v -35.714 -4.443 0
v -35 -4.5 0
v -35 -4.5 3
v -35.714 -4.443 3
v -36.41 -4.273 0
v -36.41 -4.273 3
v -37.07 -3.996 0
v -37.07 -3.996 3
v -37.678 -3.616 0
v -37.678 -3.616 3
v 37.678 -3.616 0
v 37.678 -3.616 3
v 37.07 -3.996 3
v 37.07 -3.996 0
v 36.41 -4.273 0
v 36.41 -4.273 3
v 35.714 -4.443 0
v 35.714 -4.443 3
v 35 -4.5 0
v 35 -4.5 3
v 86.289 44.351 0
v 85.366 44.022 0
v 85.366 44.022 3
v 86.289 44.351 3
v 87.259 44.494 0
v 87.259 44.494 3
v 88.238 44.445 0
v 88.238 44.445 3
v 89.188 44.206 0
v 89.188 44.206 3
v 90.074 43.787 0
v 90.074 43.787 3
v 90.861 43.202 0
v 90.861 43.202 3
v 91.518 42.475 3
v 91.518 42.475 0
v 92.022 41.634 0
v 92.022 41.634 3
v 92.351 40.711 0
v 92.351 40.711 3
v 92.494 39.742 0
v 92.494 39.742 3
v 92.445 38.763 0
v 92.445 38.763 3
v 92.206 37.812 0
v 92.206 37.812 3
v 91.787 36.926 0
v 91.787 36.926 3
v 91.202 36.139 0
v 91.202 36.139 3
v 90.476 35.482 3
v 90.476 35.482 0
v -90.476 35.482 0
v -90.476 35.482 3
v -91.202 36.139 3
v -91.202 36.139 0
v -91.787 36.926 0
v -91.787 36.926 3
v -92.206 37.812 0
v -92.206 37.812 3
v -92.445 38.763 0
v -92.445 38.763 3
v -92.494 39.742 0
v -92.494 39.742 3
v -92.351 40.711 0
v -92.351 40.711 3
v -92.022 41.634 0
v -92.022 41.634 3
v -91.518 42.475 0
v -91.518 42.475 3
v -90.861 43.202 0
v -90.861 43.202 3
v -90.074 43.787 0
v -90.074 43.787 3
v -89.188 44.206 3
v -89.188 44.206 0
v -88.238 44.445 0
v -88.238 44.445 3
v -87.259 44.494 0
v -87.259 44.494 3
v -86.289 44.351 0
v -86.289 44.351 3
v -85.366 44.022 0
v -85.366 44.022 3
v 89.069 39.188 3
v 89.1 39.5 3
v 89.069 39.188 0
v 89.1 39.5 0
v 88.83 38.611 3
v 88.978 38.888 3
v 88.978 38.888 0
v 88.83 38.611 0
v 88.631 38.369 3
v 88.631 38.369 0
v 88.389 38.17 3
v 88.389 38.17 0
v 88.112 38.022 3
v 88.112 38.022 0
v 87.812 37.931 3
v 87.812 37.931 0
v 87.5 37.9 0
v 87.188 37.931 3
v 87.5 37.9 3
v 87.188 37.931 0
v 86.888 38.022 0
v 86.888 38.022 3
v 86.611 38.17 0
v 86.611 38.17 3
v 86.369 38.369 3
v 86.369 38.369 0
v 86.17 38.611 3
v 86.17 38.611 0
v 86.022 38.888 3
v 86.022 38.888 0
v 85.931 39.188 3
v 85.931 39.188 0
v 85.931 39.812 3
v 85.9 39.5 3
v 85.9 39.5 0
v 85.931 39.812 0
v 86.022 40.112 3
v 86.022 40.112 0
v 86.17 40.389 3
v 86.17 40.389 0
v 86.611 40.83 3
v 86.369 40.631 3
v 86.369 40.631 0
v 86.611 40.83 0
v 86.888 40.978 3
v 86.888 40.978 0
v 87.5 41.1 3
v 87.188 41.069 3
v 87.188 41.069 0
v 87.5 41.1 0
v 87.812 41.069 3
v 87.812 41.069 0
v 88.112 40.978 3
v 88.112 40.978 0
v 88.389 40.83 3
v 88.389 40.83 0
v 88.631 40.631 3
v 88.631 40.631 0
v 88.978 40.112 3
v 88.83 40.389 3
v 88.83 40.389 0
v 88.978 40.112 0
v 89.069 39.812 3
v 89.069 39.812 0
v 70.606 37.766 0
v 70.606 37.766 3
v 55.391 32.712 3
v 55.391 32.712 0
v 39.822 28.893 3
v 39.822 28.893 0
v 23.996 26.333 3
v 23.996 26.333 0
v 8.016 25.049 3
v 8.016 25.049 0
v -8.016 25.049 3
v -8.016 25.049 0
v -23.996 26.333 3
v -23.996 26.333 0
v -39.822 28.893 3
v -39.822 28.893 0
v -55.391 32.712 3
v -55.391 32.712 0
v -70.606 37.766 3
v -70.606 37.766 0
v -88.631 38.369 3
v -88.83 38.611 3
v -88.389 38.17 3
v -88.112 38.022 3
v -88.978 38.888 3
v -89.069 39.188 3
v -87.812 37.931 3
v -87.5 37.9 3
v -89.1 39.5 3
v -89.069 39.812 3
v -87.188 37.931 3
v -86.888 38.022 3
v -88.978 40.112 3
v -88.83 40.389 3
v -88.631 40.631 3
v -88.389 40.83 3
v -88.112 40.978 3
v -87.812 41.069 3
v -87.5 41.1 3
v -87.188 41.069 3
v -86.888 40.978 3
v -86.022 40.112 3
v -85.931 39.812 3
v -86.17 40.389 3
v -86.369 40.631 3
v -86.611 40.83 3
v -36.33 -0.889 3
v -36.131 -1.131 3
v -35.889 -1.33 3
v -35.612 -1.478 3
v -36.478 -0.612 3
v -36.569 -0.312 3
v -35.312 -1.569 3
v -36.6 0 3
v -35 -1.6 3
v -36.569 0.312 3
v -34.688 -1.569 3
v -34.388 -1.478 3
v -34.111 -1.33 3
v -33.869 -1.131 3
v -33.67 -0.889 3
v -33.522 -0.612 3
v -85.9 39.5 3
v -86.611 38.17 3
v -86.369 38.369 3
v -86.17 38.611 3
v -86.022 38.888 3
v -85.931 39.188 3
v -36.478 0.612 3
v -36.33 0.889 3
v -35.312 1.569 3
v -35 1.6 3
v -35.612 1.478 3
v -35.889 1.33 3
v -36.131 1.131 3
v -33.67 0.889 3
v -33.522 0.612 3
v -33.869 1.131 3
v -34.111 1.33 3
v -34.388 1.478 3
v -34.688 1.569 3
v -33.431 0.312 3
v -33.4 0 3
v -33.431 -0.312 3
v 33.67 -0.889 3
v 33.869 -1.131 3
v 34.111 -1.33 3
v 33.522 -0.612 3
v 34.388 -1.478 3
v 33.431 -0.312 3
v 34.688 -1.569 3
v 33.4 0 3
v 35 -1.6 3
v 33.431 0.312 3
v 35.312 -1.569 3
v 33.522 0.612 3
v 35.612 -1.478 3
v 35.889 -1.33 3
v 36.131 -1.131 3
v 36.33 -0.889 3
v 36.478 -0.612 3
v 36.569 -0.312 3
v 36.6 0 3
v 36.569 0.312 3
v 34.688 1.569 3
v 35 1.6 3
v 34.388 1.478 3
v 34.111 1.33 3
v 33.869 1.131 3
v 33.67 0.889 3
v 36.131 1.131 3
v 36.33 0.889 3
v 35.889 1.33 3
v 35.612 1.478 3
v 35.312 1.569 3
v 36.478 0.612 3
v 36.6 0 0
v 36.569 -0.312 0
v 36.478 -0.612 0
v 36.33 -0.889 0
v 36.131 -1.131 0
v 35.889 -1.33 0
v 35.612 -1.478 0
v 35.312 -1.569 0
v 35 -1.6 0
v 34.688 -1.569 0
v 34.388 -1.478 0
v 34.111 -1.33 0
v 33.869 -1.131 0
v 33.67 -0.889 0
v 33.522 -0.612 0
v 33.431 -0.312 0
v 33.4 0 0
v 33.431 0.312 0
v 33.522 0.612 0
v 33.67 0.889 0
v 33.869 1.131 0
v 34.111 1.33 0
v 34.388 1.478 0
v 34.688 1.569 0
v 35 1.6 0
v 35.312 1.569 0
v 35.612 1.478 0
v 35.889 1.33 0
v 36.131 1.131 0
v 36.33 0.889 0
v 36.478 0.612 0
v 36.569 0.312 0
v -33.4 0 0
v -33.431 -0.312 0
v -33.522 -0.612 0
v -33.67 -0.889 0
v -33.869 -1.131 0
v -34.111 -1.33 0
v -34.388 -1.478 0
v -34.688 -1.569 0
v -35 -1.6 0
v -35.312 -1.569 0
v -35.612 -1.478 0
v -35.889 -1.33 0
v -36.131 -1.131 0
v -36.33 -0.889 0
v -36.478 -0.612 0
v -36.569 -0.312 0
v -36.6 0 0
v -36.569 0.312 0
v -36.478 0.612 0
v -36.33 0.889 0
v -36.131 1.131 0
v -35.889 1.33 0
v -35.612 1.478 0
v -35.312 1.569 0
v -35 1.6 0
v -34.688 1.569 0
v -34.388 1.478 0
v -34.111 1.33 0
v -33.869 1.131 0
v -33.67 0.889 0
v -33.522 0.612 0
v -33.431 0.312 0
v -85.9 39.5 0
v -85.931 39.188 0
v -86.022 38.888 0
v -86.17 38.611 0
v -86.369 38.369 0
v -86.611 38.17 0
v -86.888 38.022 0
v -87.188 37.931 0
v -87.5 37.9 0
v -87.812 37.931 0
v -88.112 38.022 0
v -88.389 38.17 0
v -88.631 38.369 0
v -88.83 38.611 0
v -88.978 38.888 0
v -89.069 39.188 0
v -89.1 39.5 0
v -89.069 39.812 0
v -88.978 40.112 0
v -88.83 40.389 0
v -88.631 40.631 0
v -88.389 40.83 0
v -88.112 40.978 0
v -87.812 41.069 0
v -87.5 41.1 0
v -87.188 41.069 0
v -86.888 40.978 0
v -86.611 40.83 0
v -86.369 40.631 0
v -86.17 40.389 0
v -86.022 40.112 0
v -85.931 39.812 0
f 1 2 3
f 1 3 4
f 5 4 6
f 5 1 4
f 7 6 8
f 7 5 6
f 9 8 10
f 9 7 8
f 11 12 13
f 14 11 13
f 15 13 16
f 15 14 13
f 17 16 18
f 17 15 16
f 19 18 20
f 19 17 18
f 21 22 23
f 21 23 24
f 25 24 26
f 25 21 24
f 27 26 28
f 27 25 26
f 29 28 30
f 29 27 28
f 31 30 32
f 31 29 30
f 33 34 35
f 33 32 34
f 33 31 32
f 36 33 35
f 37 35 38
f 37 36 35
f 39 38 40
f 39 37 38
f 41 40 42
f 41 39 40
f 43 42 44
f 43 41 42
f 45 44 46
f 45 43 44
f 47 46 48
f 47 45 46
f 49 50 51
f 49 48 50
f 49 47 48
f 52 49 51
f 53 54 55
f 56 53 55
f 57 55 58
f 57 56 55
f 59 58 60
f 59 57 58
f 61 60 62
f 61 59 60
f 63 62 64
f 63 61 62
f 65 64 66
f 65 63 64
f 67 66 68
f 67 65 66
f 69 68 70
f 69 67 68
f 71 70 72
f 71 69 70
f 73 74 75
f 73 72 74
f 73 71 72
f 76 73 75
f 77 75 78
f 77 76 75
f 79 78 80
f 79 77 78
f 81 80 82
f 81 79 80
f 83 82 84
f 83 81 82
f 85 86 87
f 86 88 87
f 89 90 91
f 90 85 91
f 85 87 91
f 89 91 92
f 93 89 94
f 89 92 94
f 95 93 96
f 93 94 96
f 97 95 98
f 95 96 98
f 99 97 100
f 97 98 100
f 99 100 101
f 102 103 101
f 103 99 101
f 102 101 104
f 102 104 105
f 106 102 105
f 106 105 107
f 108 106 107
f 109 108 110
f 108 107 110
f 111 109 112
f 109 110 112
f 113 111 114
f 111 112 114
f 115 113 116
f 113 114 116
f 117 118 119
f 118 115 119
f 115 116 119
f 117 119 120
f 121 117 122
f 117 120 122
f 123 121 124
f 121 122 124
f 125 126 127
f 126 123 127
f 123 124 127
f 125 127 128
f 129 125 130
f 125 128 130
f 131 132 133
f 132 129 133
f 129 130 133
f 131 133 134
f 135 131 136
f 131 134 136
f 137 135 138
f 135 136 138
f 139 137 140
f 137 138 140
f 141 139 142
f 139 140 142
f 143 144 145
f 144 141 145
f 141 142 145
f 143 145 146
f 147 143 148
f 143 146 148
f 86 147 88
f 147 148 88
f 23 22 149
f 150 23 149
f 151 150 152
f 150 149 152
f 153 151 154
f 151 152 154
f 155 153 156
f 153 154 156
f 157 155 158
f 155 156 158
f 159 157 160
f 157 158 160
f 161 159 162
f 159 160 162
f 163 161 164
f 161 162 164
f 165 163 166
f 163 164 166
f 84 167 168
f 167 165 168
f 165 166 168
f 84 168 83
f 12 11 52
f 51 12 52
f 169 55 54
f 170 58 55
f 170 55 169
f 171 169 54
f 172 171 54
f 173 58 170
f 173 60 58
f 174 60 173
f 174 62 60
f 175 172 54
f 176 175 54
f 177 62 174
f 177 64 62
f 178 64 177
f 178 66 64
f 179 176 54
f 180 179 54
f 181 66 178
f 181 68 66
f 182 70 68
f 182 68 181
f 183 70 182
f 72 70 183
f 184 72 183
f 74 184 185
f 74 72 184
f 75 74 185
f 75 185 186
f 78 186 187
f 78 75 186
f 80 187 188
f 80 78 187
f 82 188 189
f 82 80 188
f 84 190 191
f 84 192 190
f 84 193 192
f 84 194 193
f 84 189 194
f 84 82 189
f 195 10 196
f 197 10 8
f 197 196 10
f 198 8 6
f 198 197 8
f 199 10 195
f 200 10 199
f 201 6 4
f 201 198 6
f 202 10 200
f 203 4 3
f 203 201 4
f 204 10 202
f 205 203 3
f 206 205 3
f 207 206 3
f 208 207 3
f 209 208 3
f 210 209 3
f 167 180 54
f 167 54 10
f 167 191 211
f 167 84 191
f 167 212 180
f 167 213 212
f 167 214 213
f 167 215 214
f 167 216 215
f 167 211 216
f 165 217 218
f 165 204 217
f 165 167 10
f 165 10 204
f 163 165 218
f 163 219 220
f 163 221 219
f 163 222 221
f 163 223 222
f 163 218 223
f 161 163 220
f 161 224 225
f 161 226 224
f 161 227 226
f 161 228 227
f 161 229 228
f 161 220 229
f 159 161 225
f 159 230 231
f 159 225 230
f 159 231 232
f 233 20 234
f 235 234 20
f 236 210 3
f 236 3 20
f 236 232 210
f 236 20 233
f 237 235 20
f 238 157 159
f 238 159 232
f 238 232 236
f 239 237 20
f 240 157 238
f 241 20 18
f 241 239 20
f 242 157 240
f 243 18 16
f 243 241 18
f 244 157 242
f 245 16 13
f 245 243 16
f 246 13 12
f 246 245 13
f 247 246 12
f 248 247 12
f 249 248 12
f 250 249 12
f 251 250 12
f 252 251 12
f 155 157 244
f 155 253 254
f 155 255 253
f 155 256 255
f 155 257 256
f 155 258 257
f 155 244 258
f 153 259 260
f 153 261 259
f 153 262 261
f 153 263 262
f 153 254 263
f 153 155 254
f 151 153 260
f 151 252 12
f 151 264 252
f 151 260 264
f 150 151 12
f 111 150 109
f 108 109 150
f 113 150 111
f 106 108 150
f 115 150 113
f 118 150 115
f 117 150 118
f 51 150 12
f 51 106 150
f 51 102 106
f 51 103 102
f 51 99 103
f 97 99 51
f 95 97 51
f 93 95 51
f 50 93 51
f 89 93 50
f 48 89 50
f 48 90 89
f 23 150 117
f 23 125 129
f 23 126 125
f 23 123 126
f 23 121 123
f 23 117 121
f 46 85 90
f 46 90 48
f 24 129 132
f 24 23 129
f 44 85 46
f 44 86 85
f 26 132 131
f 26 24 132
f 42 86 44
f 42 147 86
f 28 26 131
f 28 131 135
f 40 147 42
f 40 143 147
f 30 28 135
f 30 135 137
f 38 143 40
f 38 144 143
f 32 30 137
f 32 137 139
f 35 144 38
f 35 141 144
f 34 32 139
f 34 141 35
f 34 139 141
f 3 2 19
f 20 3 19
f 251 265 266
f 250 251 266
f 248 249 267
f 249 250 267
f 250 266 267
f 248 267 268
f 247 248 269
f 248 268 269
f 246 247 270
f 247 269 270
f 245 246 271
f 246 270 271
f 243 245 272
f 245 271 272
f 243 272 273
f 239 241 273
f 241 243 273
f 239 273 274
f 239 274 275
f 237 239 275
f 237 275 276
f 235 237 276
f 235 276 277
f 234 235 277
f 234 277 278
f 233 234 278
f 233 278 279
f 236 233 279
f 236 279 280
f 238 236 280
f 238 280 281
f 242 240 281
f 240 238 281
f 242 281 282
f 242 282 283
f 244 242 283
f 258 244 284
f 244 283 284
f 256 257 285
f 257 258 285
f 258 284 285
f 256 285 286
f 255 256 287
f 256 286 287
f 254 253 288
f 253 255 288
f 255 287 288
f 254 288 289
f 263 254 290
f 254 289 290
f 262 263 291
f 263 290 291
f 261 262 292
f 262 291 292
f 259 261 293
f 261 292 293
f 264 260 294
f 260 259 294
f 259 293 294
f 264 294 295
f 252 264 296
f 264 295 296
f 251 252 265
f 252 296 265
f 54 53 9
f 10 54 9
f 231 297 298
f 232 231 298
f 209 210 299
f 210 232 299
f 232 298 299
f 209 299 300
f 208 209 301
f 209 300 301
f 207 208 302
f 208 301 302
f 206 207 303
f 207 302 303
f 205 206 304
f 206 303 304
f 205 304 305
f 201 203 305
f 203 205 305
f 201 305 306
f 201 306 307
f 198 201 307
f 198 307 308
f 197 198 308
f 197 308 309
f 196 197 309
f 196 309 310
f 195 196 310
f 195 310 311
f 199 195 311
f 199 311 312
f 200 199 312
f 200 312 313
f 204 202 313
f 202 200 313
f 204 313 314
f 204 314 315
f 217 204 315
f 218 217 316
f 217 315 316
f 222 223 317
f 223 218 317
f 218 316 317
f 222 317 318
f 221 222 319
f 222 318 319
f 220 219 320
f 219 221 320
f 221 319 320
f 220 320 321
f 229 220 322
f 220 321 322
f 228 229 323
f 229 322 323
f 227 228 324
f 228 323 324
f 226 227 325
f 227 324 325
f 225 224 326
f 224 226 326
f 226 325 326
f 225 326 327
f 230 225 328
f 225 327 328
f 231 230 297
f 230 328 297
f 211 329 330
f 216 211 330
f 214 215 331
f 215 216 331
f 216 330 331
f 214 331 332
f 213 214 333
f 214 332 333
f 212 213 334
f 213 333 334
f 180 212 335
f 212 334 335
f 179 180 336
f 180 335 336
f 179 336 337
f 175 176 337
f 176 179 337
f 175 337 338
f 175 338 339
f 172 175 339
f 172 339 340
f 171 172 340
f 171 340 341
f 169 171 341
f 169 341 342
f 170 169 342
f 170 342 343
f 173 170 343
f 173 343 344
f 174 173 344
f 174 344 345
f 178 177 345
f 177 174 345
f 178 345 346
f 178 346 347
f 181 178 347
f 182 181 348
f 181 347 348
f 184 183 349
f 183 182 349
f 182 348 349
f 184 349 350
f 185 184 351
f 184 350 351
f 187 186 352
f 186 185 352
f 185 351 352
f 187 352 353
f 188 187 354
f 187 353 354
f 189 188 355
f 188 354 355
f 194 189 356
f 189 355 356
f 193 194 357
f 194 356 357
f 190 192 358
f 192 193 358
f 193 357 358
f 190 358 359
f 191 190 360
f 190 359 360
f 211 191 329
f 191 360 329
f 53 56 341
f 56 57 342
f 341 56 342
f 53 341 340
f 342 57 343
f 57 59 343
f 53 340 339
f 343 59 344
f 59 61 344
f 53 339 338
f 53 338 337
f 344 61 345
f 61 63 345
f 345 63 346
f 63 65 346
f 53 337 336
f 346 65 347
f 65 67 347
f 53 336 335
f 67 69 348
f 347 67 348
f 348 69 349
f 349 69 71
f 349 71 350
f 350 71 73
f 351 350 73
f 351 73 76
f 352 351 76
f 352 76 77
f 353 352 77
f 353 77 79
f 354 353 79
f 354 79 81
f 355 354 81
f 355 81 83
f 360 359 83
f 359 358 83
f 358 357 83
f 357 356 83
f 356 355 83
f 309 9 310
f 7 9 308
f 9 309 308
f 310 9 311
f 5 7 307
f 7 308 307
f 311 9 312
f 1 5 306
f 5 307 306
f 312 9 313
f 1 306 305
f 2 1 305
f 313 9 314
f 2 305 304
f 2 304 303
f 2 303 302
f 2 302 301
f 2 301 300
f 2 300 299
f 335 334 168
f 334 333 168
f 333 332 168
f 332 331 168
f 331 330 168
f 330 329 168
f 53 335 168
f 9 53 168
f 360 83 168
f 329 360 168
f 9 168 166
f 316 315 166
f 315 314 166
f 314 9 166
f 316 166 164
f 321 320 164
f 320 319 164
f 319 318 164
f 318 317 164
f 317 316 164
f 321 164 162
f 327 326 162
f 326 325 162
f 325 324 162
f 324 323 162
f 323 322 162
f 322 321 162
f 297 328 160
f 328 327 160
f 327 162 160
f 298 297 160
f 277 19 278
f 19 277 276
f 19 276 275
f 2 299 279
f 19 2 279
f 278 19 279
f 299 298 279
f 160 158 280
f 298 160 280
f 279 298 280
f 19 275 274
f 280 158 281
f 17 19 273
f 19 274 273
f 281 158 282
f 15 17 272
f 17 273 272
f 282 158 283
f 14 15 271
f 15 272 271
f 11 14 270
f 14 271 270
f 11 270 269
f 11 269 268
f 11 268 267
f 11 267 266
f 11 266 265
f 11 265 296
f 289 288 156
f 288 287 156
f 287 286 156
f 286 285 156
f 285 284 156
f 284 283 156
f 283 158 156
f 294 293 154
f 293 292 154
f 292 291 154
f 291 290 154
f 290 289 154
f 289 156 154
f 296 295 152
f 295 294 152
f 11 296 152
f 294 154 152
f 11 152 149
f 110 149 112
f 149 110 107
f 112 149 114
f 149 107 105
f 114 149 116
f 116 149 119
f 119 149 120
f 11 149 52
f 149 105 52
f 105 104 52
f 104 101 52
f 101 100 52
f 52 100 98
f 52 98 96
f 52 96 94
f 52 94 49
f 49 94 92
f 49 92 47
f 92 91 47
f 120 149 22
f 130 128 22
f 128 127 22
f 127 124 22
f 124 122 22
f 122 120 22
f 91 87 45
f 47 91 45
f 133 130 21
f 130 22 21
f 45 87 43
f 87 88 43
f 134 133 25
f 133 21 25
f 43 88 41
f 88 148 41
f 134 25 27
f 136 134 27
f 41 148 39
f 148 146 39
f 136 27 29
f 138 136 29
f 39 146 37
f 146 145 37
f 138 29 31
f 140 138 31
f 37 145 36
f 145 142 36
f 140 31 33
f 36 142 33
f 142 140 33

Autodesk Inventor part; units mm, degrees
ref_plane "YZ Plane" through (0, 0, 0) normal (1, 0, 0) x (0, 1, 0)
ref_plane "XZ Plane" through (0, 0, 0) normal (0, 1, 0) x (-1, 0, 0)
ref_plane "XY Plane" through (0, 0, 0) normal (0, 0, 1) x (1, 0, 0)
sketch "スケッチ1" plane through (0, 0, 0) normal (0, 0, 1) x (1, 0, 0)
  circle A0 centre (-35, 0) radius 1.6
  circle A1 centre (35, 0) radius 1.6
  circle A2 centre (-87.5, 39.5) radius 1.6
  circle A3 centre (87.5, 39.5) radius 1.6
  arc A4 (-85.3659, 44.0217) -> (-90.4756, 35.4818) centre (-87.5, 39.5) ccw
  arc A5 (-37.678, -3.6164) -> (-35, -4.5) centre (-35, 0) ccw
  arc A6 (35, -4.5) -> (37.678, -3.6164) centre (35, 0) ccw
  arc A7 (90.4756, 35.4818) -> (85.3659, 44.0217) centre (87.5, 39.5) ccw
  arc A8 (-85.3659, 44.0217) -> (85.3659, 44.0217) centre (0, 224.8881) ccw
  line L0 (-90.4756, 35.4818) -> (-37.678, -3.6164)
  line L1 (-35, -4.5) -> (35, -4.5)
  line L2 (37.678, -3.6164) -> (90.4756, 35.4818)
  point P0 (0, 0)
  dimension "d0" = 3.2
  dimension "d1" = 3.2
  dimension "d2" = 70
  dimension "d3" = 35
  dimension "d4" = 3.2
  dimension "d5" = 3.2
  dimension "d6" = 39.5
  dimension "d7" = 175
  dimension "d8" = 87.5
  dimension "d9" = 5
  dimension "d10" = 4.5
  dimension "d11" = 4.5
  dimension "d12" = 5
  dimension "d13" = 200
extrude "押し出し1" add sketch "スケッチ1" along normal blind 3
equation "\"d3\" = 0.5 * d2"
equation "\"d8\" = 0.5 * d7"
properties part number "ハンド_下側板" material "アルミニウム 6061"
